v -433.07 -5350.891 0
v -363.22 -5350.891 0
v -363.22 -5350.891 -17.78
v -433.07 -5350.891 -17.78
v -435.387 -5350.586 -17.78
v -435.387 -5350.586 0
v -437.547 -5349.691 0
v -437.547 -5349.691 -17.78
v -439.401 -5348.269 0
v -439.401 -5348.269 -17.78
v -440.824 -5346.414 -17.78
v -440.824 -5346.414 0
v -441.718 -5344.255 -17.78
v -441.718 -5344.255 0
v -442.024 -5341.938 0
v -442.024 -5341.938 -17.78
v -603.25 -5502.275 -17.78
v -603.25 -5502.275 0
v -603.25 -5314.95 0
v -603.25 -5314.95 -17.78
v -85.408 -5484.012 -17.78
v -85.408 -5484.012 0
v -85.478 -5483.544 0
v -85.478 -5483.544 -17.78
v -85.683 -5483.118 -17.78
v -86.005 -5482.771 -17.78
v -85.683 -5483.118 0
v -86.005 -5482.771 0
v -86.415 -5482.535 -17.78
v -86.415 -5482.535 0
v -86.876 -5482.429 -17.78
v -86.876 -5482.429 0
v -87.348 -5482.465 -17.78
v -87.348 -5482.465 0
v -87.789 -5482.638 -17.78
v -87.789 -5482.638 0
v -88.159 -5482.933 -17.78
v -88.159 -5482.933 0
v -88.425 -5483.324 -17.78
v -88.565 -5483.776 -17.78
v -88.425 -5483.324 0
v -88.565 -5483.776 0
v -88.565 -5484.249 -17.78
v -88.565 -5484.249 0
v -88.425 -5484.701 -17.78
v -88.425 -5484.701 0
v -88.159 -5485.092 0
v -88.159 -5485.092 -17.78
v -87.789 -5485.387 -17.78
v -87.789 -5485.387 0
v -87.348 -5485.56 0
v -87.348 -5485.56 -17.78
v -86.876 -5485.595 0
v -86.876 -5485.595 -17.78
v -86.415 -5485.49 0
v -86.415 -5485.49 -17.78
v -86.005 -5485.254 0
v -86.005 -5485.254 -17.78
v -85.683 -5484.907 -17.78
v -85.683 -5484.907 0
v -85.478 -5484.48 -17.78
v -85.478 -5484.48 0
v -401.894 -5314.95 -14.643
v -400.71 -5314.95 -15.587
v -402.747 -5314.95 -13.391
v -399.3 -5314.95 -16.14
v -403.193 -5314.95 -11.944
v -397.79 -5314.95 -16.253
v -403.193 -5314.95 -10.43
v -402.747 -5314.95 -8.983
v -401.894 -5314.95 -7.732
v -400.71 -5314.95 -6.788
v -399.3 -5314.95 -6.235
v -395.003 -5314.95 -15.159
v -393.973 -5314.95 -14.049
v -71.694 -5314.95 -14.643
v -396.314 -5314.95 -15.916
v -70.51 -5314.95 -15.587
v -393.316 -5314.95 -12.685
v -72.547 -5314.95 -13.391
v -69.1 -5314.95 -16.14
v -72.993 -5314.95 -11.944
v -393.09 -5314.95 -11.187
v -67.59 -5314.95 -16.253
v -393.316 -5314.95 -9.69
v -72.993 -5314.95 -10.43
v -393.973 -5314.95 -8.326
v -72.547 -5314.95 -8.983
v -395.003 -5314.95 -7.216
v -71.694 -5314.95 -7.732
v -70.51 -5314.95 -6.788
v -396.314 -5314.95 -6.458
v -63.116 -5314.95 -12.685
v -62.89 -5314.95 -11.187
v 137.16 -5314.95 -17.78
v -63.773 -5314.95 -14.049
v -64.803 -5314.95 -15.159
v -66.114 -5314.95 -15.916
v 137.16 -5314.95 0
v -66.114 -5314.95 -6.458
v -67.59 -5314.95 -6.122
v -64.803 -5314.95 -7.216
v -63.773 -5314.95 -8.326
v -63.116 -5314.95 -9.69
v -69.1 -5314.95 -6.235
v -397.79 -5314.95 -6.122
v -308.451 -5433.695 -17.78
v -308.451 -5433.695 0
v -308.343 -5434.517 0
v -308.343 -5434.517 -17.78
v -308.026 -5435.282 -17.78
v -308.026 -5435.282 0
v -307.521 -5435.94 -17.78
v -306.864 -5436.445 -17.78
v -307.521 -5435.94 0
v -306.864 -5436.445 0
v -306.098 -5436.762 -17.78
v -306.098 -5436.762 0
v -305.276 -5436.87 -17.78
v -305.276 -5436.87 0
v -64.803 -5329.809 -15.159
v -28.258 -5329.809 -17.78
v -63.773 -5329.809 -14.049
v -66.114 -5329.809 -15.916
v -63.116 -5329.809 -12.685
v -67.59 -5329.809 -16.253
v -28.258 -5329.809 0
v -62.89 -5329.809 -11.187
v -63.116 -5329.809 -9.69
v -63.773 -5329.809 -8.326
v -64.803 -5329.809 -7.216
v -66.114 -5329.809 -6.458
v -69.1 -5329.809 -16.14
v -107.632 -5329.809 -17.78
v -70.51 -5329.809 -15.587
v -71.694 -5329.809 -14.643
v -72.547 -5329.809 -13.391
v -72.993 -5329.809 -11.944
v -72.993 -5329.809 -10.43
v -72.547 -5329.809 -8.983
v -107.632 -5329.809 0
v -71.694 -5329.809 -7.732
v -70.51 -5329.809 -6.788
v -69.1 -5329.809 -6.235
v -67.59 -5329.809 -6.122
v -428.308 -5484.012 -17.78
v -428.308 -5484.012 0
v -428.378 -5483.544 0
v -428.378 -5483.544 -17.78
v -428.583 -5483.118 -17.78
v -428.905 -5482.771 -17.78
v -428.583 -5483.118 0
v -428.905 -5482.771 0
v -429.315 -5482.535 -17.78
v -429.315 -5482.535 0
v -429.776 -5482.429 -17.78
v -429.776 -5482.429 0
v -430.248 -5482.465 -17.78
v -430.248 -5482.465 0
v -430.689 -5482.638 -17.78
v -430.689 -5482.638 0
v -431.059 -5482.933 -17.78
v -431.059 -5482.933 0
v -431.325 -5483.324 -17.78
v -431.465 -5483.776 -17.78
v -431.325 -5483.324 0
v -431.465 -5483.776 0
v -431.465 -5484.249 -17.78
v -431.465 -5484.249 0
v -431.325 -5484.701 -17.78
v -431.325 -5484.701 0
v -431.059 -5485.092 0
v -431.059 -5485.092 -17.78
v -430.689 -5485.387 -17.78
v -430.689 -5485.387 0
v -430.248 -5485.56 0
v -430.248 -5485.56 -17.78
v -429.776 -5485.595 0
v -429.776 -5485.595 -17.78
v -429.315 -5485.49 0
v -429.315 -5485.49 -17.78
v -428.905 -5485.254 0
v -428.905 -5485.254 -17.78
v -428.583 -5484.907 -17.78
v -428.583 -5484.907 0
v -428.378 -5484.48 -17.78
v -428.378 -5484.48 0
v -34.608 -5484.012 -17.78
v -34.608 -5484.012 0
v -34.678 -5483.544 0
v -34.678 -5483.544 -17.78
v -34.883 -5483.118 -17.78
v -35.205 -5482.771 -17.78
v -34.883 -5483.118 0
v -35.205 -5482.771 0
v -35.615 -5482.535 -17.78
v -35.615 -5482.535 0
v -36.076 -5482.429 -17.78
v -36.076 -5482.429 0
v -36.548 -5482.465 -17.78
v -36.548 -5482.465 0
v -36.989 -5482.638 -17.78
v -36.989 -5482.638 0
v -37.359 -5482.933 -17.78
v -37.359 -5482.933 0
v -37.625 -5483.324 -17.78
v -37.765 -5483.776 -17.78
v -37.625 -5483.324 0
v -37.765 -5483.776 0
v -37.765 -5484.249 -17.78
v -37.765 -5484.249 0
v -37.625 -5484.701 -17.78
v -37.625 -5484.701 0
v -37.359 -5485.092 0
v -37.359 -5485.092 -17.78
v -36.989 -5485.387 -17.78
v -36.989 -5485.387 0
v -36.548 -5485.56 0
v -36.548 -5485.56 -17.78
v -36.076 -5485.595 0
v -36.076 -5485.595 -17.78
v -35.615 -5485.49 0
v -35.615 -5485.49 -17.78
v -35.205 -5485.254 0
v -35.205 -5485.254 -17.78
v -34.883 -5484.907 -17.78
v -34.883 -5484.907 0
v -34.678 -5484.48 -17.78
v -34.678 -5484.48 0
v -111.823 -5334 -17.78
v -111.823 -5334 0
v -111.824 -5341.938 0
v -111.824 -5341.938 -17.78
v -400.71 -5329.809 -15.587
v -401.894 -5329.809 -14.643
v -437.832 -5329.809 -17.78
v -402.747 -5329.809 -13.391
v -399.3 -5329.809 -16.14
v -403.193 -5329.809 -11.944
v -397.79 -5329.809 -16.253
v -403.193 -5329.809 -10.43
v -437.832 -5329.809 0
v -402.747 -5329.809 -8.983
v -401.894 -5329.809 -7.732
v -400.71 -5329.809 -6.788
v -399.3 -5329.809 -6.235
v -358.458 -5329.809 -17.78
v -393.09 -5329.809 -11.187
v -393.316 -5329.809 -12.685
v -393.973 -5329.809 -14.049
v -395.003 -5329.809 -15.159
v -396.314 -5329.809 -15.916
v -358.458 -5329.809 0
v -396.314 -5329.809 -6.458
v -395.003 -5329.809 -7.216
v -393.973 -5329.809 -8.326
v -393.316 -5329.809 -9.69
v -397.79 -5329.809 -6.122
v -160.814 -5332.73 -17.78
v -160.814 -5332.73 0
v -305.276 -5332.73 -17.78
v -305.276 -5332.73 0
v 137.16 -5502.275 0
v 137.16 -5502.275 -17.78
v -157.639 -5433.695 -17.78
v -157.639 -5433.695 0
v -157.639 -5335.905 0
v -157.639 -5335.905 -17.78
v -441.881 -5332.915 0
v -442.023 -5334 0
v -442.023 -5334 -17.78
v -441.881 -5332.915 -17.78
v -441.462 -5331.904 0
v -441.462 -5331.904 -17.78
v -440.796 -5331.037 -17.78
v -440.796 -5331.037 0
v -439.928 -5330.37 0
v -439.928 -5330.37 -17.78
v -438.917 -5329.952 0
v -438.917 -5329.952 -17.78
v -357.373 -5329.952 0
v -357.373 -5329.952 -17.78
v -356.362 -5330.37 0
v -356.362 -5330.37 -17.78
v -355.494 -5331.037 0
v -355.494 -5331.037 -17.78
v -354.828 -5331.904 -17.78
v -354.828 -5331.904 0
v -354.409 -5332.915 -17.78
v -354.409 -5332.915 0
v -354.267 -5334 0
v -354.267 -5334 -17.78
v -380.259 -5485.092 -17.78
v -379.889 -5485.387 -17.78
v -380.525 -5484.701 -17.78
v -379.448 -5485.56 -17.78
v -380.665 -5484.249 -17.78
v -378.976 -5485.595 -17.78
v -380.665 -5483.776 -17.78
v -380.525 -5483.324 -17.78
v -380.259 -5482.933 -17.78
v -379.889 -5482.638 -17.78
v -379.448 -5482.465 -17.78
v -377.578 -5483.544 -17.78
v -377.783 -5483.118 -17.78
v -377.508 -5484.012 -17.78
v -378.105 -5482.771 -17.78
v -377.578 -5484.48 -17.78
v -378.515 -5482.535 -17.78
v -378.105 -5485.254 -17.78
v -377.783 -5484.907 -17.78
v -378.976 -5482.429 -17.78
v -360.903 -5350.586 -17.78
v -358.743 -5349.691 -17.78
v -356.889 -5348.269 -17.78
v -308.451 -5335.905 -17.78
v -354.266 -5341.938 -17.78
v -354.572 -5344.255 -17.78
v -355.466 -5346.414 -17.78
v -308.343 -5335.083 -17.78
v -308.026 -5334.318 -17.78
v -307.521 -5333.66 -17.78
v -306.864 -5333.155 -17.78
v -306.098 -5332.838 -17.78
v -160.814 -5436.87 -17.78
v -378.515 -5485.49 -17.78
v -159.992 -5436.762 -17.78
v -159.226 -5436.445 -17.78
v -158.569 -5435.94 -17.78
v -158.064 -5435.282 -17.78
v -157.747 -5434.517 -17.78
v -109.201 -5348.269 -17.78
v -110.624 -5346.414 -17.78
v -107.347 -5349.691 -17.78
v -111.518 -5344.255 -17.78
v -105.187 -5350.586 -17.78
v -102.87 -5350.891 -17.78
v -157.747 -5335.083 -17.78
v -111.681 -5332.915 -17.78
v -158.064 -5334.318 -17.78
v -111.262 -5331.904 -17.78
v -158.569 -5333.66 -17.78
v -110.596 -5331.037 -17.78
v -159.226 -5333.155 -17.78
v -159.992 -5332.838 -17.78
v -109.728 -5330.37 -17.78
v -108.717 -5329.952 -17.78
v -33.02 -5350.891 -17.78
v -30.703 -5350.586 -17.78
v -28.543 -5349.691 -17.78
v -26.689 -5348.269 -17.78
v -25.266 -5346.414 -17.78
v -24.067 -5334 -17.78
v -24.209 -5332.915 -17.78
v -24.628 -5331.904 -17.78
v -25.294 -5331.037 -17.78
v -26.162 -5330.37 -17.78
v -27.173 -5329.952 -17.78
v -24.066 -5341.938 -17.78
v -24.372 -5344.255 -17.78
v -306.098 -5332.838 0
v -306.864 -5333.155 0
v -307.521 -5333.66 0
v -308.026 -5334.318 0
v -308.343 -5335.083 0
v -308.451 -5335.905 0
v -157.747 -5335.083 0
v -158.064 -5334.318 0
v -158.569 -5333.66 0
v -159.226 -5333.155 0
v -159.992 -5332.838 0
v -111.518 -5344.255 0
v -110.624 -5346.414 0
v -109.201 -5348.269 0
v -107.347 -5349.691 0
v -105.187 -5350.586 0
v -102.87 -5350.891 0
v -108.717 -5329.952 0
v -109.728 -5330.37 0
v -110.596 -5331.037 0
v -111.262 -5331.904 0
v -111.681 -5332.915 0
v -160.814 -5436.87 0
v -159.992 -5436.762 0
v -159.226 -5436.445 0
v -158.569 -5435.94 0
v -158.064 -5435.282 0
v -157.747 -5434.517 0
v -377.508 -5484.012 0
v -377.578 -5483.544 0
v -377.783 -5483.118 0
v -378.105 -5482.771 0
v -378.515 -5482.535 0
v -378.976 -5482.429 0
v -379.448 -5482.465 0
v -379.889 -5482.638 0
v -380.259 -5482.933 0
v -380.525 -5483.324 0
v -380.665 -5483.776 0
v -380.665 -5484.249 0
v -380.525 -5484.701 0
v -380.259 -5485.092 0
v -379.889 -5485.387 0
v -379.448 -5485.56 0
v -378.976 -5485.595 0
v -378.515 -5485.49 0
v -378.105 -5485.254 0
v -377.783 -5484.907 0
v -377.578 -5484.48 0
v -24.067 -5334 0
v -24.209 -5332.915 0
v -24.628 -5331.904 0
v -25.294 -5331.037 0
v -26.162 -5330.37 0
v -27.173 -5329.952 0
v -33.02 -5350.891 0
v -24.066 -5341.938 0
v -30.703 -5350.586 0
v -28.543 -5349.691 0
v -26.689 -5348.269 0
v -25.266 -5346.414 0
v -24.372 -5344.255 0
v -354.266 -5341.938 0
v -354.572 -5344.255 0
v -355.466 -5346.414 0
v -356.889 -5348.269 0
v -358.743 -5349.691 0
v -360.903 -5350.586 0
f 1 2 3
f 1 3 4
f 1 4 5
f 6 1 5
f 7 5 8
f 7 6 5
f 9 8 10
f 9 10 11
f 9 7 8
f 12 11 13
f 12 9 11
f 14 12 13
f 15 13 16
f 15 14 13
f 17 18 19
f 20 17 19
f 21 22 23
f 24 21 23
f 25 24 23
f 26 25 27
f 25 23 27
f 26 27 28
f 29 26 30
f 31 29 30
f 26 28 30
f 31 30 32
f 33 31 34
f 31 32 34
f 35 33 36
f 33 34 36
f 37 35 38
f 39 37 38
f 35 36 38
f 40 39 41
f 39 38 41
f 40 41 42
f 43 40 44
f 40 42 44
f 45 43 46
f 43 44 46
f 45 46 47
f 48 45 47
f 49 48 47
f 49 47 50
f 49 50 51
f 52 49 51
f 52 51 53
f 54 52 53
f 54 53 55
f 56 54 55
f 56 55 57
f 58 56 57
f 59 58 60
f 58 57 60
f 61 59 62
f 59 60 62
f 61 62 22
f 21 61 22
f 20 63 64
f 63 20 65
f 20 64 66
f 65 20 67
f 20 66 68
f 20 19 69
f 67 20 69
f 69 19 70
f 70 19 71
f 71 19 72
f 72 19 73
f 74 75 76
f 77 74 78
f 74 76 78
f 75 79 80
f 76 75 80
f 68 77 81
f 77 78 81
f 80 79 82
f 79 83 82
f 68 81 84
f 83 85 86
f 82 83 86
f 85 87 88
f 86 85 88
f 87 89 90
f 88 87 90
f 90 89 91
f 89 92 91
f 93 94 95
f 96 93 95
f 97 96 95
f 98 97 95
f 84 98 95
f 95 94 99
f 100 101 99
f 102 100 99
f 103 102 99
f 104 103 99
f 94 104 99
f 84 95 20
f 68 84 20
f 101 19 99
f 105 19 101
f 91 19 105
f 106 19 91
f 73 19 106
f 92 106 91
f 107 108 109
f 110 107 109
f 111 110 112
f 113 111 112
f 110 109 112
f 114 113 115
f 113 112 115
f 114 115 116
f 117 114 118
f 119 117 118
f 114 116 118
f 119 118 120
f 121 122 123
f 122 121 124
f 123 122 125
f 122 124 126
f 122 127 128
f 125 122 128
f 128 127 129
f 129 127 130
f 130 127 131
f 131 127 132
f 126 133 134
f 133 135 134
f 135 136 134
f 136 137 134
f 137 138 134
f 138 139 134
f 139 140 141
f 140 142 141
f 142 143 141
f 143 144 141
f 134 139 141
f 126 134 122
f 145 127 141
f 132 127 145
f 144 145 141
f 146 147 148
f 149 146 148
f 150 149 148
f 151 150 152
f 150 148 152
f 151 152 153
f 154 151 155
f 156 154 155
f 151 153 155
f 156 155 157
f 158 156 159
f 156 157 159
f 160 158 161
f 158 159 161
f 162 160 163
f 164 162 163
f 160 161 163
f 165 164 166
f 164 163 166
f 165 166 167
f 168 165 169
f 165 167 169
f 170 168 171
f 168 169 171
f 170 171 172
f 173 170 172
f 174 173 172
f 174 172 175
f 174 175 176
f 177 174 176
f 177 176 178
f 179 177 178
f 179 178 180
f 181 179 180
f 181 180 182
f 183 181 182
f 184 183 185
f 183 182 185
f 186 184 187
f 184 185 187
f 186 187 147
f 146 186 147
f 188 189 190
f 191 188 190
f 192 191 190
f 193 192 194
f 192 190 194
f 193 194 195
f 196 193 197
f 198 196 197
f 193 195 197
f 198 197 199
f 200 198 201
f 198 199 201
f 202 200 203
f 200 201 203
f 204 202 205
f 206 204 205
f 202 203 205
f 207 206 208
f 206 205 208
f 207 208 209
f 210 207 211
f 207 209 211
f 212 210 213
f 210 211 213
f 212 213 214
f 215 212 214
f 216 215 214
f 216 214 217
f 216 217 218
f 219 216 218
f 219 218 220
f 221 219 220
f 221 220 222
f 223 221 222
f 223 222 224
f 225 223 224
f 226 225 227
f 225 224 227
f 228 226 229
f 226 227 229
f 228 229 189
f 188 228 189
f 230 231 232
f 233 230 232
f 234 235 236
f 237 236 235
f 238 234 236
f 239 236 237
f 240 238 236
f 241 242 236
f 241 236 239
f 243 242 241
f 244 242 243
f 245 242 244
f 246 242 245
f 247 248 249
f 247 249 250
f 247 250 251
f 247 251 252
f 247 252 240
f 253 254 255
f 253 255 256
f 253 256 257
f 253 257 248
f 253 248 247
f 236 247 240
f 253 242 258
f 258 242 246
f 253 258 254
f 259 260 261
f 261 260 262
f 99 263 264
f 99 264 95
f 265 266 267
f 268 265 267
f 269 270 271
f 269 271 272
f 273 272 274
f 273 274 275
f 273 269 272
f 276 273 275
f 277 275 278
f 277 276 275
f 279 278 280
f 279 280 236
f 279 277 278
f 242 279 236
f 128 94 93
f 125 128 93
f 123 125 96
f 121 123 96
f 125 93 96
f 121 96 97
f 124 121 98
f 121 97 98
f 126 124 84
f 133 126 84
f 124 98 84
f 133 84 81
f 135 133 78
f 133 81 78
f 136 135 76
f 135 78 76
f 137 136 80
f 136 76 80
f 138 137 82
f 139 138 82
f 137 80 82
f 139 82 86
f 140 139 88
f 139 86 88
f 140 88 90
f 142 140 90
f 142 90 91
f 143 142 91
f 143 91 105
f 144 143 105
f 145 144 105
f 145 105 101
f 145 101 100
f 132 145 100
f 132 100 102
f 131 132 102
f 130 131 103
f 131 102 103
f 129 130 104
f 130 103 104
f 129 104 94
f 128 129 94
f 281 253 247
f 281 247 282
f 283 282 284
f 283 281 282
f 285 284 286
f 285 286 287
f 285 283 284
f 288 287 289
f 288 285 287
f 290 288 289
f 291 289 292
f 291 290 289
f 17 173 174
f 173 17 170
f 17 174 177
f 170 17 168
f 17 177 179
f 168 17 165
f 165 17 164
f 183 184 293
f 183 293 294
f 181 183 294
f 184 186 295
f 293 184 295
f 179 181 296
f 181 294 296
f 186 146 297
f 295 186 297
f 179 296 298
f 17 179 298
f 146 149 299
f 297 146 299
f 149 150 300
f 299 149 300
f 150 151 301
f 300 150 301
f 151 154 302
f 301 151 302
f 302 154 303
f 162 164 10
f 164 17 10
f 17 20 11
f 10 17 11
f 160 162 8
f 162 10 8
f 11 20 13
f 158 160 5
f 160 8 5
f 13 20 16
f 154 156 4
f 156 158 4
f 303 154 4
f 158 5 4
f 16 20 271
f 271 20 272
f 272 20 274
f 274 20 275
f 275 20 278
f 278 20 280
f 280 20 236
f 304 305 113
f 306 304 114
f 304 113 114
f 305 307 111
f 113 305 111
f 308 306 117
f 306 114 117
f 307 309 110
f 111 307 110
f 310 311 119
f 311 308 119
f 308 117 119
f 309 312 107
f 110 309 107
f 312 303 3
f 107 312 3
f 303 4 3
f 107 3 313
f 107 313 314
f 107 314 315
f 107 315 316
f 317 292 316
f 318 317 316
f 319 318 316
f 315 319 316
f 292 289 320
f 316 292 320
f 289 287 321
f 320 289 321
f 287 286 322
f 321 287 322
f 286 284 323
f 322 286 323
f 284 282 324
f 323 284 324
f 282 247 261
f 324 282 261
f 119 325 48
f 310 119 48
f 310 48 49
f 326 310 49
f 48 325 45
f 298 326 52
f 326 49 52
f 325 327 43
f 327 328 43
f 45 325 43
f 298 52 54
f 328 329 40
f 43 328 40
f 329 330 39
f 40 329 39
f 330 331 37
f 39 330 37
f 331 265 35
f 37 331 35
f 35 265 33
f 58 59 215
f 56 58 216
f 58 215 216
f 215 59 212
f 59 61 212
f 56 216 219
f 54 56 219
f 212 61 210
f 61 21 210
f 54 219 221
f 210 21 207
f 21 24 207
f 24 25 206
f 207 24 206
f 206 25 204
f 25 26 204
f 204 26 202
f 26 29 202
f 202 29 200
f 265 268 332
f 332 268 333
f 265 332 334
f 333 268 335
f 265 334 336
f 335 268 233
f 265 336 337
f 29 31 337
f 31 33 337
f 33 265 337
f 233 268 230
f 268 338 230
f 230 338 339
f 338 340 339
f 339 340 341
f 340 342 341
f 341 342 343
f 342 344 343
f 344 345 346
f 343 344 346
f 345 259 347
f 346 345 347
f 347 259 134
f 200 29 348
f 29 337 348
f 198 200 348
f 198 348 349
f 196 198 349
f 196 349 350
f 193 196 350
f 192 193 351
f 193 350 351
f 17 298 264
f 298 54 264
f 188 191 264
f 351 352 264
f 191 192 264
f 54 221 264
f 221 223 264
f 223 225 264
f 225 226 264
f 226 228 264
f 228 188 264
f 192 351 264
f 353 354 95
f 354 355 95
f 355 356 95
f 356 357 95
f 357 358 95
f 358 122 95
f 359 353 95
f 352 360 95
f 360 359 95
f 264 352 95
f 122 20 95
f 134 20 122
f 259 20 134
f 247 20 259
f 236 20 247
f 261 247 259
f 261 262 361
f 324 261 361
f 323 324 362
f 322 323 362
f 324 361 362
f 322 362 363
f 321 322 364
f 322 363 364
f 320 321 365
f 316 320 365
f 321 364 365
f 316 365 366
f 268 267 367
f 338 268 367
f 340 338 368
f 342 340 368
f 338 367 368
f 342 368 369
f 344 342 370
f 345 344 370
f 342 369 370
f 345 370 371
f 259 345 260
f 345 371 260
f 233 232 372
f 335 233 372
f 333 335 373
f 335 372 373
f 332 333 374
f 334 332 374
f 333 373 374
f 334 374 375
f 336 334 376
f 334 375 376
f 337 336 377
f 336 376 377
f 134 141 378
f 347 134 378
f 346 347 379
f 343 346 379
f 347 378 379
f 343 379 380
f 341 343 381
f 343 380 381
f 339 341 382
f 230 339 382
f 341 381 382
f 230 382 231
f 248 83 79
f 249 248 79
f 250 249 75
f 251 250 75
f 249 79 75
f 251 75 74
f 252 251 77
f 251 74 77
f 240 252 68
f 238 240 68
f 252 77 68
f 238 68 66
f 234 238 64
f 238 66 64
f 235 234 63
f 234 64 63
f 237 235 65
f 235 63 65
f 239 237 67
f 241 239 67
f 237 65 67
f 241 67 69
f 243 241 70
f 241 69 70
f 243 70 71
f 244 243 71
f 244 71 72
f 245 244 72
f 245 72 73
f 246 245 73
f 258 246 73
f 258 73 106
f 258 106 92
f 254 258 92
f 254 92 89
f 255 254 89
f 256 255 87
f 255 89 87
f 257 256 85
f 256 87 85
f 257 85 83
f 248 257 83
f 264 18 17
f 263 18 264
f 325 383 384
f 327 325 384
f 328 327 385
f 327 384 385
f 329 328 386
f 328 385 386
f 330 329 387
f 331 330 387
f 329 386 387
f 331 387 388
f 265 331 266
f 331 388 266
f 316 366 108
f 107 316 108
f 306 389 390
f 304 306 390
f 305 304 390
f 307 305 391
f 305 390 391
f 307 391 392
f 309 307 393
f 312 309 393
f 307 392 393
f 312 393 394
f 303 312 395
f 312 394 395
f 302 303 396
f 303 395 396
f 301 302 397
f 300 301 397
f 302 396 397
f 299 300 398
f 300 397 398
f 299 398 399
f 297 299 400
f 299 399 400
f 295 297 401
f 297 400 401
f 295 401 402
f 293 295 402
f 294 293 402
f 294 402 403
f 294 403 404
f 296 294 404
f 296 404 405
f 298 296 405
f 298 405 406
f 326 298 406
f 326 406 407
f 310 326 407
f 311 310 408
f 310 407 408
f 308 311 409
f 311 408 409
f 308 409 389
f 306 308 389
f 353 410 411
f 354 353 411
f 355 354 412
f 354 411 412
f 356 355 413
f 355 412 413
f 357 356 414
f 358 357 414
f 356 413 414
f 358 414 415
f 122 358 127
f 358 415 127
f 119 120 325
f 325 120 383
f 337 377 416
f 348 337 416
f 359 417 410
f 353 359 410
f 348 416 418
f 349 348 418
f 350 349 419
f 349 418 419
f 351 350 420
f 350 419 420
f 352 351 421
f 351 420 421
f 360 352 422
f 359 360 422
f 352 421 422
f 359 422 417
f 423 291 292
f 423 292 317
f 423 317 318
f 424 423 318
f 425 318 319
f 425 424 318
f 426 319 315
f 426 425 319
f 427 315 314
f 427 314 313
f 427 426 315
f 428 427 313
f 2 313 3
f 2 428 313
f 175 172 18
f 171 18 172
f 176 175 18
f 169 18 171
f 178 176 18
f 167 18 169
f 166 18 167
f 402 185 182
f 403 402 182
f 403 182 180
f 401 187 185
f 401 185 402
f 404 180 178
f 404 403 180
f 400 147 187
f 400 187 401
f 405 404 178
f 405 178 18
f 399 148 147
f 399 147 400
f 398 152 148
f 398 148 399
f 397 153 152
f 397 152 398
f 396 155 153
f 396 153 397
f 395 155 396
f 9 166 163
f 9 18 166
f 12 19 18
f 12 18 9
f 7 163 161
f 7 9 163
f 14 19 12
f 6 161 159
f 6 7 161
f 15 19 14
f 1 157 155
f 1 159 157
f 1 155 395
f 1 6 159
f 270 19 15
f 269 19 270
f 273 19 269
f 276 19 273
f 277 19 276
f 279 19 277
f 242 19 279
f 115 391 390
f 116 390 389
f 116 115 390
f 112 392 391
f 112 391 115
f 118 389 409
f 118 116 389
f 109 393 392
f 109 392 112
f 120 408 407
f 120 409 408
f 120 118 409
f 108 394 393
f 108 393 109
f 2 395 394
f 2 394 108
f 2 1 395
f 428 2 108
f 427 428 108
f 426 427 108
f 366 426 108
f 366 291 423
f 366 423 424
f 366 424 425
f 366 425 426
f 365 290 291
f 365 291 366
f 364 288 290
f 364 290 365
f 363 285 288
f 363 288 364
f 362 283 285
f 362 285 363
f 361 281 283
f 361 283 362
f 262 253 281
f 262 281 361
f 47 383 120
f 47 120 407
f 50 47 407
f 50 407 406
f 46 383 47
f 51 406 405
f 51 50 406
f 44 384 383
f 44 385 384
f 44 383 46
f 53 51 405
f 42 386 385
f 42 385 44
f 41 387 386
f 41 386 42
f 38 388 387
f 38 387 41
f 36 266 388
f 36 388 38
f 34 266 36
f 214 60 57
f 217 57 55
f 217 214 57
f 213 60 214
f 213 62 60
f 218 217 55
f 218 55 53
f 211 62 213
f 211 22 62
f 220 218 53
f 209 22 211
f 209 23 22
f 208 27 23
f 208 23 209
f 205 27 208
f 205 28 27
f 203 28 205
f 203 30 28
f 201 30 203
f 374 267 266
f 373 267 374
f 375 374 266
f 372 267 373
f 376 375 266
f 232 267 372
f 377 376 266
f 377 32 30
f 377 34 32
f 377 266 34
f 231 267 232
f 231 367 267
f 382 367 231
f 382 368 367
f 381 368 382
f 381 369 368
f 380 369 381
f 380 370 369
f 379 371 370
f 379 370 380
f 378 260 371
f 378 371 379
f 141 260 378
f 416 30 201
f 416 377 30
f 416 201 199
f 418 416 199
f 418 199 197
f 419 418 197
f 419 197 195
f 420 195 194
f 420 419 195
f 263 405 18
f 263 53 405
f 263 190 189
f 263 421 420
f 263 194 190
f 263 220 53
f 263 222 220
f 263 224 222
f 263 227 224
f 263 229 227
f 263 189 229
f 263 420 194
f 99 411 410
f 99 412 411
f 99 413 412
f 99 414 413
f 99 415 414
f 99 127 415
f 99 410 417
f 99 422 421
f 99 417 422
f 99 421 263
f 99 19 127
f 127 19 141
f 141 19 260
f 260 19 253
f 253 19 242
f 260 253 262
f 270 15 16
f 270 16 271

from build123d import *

# Parameters (mm, degrees)
HEADBOTTOMOUTLINE_W               = 740.41
HEADBOTTOMOUTLINE_H               = 187.325
HEADBOTTOMOUTLINE_THICKNESS_DEPTH = 17.78
SKETCH3_R                         = 1.5875
CUT_EXTRUDE1_DEPTH                = 17.78
SKETCH4_R                         = 5.08
CUT_EXTRUDE2_DEPTH                = 14.859


with BuildPart() as part:
    # HeadBottomOutline → HeadBottomOutline_Thickness (new body)
    with BuildSketch(Plane.XY):
        with Locations((-233.045, -5408.6125)):
            Rectangle(HEADBOTTOMOUTLINE_W, HEADBOTTOMOUTLINE_H)
    extrude(amount=-HEADBOTTOMOUTLINE_THICKNESS_DEPTH)

    # Sketch3 → Cut-Extrude1 (cut)
    with BuildSketch(Plane.XY):
        with Locations((-429.895, -5484.0124)):
            Circle(SKETCH3_R)
        with Locations((-379.095, -5484.0124)):
            Circle(SKETCH3_R)
        with Locations((-86.995, -5484.0124)):
            Circle(SKETCH3_R)
        with Locations((-36.195, -5484.0124)):
            Circle(SKETCH3_R)
        with BuildLine():
            Line((-308.45125, -5335.905), (-308.45125, -5433.695))
            ThreePointArc((-308.45125, -5433.695), (-307.52131403, -5435.94006403), (-305.27625, -5436.87))
            Line((-305.27625, -5436.87), (-160.81375, -5436.87))
            ThreePointArc((-160.81375, -5436.87), (-158.56868597, -5435.94006403), (-157.63875, -5433.695))
            Line((-157.63875, -5433.695), (-157.63875, -5335.905))
            ThreePointArc((-157.63875, -5335.905), (-158.56868597, -5333.65993597), (-160.81375, -5332.73))
            Line((-160.81375, -5332.73), (-305.27625, -5332.73))
            ThreePointArc((-305.27625, -5332.73), (-307.52131403, -5333.65993597), (-308.45125, -5335.905))
        make_face()
        with BuildLine():
            Line((-354.2665, -5334), (-354.2665, -5341.9375))
            ThreePointArc((-354.2665, -5341.9375), (-356.888919435, -5348.268580565), (-363.22, -5350.891))
            Line((-363.22, -5350.891), (-433.07, -5350.891))
            ThreePointArc((-433.07, -5350.891), (-439.401080565, -5348.268580565), (-442.0235, -5341.9375))
            Line((-442.0235, -5341.9375), (-442.0235, -5334))
            ThreePointArc((-442.0235, -5334), (-440.79598452, -5331.03651548), (-437.8325, -5329.809))
            Line((-437.8325, -5329.809), (-358.4575, -5329.809))
            ThreePointArc((-358.4575, -5329.809), (-355.49401548, -5331.03651548), (-354.2665, -5334))
        make_face()
        with BuildLine():
            Line((-102.87, -5350.891), (-33.02, -5350.891))
            ThreePointArc((-33.02, -5350.891), (-26.688919435, -5348.268580565), (-24.0665, -5341.9375))
            Line((-24.0665, -5341.9375), (-24.0665, -5334))
            ThreePointArc((-24.0665, -5334), (-25.29401548, -5331.03651548), (-28.2575, -5329.809))
            Line((-28.2575, -5329.809), (-107.6325, -5329.809))
            ThreePointArc((-107.6325, -5329.809), (-110.59598452, -5331.03651548), (-111.8235, -5334))
            Line((-111.8235, -5334), (-111.8235, -5341.9375))
            ThreePointArc((-111.8235, -5341.9375), (-109.201080565, -5348.268580565), (-102.87, -5350.891))
        make_face()
    extrude(amount=-CUT_EXTRUDE1_DEPTH, mode=Mode.SUBTRACT)

    # Sketch4 → Cut-Extrude2 (cut)
    with BuildSketch(Plane(origin=(0, -5314.95, 0), x_dir=(1, 0, 0), z_dir=(0, 1, 0))):
        with Locations((-67.9699936, 11.187303)):
            Circle(SKETCH4_R)
        with Locations((-398.1699936, 11.187303)):
            Circle(SKETCH4_R)
    extrude(amount=-CUT_EXTRUDE2_DEPTH, mode=Mode.SUBTRACT)


solid = part.part
